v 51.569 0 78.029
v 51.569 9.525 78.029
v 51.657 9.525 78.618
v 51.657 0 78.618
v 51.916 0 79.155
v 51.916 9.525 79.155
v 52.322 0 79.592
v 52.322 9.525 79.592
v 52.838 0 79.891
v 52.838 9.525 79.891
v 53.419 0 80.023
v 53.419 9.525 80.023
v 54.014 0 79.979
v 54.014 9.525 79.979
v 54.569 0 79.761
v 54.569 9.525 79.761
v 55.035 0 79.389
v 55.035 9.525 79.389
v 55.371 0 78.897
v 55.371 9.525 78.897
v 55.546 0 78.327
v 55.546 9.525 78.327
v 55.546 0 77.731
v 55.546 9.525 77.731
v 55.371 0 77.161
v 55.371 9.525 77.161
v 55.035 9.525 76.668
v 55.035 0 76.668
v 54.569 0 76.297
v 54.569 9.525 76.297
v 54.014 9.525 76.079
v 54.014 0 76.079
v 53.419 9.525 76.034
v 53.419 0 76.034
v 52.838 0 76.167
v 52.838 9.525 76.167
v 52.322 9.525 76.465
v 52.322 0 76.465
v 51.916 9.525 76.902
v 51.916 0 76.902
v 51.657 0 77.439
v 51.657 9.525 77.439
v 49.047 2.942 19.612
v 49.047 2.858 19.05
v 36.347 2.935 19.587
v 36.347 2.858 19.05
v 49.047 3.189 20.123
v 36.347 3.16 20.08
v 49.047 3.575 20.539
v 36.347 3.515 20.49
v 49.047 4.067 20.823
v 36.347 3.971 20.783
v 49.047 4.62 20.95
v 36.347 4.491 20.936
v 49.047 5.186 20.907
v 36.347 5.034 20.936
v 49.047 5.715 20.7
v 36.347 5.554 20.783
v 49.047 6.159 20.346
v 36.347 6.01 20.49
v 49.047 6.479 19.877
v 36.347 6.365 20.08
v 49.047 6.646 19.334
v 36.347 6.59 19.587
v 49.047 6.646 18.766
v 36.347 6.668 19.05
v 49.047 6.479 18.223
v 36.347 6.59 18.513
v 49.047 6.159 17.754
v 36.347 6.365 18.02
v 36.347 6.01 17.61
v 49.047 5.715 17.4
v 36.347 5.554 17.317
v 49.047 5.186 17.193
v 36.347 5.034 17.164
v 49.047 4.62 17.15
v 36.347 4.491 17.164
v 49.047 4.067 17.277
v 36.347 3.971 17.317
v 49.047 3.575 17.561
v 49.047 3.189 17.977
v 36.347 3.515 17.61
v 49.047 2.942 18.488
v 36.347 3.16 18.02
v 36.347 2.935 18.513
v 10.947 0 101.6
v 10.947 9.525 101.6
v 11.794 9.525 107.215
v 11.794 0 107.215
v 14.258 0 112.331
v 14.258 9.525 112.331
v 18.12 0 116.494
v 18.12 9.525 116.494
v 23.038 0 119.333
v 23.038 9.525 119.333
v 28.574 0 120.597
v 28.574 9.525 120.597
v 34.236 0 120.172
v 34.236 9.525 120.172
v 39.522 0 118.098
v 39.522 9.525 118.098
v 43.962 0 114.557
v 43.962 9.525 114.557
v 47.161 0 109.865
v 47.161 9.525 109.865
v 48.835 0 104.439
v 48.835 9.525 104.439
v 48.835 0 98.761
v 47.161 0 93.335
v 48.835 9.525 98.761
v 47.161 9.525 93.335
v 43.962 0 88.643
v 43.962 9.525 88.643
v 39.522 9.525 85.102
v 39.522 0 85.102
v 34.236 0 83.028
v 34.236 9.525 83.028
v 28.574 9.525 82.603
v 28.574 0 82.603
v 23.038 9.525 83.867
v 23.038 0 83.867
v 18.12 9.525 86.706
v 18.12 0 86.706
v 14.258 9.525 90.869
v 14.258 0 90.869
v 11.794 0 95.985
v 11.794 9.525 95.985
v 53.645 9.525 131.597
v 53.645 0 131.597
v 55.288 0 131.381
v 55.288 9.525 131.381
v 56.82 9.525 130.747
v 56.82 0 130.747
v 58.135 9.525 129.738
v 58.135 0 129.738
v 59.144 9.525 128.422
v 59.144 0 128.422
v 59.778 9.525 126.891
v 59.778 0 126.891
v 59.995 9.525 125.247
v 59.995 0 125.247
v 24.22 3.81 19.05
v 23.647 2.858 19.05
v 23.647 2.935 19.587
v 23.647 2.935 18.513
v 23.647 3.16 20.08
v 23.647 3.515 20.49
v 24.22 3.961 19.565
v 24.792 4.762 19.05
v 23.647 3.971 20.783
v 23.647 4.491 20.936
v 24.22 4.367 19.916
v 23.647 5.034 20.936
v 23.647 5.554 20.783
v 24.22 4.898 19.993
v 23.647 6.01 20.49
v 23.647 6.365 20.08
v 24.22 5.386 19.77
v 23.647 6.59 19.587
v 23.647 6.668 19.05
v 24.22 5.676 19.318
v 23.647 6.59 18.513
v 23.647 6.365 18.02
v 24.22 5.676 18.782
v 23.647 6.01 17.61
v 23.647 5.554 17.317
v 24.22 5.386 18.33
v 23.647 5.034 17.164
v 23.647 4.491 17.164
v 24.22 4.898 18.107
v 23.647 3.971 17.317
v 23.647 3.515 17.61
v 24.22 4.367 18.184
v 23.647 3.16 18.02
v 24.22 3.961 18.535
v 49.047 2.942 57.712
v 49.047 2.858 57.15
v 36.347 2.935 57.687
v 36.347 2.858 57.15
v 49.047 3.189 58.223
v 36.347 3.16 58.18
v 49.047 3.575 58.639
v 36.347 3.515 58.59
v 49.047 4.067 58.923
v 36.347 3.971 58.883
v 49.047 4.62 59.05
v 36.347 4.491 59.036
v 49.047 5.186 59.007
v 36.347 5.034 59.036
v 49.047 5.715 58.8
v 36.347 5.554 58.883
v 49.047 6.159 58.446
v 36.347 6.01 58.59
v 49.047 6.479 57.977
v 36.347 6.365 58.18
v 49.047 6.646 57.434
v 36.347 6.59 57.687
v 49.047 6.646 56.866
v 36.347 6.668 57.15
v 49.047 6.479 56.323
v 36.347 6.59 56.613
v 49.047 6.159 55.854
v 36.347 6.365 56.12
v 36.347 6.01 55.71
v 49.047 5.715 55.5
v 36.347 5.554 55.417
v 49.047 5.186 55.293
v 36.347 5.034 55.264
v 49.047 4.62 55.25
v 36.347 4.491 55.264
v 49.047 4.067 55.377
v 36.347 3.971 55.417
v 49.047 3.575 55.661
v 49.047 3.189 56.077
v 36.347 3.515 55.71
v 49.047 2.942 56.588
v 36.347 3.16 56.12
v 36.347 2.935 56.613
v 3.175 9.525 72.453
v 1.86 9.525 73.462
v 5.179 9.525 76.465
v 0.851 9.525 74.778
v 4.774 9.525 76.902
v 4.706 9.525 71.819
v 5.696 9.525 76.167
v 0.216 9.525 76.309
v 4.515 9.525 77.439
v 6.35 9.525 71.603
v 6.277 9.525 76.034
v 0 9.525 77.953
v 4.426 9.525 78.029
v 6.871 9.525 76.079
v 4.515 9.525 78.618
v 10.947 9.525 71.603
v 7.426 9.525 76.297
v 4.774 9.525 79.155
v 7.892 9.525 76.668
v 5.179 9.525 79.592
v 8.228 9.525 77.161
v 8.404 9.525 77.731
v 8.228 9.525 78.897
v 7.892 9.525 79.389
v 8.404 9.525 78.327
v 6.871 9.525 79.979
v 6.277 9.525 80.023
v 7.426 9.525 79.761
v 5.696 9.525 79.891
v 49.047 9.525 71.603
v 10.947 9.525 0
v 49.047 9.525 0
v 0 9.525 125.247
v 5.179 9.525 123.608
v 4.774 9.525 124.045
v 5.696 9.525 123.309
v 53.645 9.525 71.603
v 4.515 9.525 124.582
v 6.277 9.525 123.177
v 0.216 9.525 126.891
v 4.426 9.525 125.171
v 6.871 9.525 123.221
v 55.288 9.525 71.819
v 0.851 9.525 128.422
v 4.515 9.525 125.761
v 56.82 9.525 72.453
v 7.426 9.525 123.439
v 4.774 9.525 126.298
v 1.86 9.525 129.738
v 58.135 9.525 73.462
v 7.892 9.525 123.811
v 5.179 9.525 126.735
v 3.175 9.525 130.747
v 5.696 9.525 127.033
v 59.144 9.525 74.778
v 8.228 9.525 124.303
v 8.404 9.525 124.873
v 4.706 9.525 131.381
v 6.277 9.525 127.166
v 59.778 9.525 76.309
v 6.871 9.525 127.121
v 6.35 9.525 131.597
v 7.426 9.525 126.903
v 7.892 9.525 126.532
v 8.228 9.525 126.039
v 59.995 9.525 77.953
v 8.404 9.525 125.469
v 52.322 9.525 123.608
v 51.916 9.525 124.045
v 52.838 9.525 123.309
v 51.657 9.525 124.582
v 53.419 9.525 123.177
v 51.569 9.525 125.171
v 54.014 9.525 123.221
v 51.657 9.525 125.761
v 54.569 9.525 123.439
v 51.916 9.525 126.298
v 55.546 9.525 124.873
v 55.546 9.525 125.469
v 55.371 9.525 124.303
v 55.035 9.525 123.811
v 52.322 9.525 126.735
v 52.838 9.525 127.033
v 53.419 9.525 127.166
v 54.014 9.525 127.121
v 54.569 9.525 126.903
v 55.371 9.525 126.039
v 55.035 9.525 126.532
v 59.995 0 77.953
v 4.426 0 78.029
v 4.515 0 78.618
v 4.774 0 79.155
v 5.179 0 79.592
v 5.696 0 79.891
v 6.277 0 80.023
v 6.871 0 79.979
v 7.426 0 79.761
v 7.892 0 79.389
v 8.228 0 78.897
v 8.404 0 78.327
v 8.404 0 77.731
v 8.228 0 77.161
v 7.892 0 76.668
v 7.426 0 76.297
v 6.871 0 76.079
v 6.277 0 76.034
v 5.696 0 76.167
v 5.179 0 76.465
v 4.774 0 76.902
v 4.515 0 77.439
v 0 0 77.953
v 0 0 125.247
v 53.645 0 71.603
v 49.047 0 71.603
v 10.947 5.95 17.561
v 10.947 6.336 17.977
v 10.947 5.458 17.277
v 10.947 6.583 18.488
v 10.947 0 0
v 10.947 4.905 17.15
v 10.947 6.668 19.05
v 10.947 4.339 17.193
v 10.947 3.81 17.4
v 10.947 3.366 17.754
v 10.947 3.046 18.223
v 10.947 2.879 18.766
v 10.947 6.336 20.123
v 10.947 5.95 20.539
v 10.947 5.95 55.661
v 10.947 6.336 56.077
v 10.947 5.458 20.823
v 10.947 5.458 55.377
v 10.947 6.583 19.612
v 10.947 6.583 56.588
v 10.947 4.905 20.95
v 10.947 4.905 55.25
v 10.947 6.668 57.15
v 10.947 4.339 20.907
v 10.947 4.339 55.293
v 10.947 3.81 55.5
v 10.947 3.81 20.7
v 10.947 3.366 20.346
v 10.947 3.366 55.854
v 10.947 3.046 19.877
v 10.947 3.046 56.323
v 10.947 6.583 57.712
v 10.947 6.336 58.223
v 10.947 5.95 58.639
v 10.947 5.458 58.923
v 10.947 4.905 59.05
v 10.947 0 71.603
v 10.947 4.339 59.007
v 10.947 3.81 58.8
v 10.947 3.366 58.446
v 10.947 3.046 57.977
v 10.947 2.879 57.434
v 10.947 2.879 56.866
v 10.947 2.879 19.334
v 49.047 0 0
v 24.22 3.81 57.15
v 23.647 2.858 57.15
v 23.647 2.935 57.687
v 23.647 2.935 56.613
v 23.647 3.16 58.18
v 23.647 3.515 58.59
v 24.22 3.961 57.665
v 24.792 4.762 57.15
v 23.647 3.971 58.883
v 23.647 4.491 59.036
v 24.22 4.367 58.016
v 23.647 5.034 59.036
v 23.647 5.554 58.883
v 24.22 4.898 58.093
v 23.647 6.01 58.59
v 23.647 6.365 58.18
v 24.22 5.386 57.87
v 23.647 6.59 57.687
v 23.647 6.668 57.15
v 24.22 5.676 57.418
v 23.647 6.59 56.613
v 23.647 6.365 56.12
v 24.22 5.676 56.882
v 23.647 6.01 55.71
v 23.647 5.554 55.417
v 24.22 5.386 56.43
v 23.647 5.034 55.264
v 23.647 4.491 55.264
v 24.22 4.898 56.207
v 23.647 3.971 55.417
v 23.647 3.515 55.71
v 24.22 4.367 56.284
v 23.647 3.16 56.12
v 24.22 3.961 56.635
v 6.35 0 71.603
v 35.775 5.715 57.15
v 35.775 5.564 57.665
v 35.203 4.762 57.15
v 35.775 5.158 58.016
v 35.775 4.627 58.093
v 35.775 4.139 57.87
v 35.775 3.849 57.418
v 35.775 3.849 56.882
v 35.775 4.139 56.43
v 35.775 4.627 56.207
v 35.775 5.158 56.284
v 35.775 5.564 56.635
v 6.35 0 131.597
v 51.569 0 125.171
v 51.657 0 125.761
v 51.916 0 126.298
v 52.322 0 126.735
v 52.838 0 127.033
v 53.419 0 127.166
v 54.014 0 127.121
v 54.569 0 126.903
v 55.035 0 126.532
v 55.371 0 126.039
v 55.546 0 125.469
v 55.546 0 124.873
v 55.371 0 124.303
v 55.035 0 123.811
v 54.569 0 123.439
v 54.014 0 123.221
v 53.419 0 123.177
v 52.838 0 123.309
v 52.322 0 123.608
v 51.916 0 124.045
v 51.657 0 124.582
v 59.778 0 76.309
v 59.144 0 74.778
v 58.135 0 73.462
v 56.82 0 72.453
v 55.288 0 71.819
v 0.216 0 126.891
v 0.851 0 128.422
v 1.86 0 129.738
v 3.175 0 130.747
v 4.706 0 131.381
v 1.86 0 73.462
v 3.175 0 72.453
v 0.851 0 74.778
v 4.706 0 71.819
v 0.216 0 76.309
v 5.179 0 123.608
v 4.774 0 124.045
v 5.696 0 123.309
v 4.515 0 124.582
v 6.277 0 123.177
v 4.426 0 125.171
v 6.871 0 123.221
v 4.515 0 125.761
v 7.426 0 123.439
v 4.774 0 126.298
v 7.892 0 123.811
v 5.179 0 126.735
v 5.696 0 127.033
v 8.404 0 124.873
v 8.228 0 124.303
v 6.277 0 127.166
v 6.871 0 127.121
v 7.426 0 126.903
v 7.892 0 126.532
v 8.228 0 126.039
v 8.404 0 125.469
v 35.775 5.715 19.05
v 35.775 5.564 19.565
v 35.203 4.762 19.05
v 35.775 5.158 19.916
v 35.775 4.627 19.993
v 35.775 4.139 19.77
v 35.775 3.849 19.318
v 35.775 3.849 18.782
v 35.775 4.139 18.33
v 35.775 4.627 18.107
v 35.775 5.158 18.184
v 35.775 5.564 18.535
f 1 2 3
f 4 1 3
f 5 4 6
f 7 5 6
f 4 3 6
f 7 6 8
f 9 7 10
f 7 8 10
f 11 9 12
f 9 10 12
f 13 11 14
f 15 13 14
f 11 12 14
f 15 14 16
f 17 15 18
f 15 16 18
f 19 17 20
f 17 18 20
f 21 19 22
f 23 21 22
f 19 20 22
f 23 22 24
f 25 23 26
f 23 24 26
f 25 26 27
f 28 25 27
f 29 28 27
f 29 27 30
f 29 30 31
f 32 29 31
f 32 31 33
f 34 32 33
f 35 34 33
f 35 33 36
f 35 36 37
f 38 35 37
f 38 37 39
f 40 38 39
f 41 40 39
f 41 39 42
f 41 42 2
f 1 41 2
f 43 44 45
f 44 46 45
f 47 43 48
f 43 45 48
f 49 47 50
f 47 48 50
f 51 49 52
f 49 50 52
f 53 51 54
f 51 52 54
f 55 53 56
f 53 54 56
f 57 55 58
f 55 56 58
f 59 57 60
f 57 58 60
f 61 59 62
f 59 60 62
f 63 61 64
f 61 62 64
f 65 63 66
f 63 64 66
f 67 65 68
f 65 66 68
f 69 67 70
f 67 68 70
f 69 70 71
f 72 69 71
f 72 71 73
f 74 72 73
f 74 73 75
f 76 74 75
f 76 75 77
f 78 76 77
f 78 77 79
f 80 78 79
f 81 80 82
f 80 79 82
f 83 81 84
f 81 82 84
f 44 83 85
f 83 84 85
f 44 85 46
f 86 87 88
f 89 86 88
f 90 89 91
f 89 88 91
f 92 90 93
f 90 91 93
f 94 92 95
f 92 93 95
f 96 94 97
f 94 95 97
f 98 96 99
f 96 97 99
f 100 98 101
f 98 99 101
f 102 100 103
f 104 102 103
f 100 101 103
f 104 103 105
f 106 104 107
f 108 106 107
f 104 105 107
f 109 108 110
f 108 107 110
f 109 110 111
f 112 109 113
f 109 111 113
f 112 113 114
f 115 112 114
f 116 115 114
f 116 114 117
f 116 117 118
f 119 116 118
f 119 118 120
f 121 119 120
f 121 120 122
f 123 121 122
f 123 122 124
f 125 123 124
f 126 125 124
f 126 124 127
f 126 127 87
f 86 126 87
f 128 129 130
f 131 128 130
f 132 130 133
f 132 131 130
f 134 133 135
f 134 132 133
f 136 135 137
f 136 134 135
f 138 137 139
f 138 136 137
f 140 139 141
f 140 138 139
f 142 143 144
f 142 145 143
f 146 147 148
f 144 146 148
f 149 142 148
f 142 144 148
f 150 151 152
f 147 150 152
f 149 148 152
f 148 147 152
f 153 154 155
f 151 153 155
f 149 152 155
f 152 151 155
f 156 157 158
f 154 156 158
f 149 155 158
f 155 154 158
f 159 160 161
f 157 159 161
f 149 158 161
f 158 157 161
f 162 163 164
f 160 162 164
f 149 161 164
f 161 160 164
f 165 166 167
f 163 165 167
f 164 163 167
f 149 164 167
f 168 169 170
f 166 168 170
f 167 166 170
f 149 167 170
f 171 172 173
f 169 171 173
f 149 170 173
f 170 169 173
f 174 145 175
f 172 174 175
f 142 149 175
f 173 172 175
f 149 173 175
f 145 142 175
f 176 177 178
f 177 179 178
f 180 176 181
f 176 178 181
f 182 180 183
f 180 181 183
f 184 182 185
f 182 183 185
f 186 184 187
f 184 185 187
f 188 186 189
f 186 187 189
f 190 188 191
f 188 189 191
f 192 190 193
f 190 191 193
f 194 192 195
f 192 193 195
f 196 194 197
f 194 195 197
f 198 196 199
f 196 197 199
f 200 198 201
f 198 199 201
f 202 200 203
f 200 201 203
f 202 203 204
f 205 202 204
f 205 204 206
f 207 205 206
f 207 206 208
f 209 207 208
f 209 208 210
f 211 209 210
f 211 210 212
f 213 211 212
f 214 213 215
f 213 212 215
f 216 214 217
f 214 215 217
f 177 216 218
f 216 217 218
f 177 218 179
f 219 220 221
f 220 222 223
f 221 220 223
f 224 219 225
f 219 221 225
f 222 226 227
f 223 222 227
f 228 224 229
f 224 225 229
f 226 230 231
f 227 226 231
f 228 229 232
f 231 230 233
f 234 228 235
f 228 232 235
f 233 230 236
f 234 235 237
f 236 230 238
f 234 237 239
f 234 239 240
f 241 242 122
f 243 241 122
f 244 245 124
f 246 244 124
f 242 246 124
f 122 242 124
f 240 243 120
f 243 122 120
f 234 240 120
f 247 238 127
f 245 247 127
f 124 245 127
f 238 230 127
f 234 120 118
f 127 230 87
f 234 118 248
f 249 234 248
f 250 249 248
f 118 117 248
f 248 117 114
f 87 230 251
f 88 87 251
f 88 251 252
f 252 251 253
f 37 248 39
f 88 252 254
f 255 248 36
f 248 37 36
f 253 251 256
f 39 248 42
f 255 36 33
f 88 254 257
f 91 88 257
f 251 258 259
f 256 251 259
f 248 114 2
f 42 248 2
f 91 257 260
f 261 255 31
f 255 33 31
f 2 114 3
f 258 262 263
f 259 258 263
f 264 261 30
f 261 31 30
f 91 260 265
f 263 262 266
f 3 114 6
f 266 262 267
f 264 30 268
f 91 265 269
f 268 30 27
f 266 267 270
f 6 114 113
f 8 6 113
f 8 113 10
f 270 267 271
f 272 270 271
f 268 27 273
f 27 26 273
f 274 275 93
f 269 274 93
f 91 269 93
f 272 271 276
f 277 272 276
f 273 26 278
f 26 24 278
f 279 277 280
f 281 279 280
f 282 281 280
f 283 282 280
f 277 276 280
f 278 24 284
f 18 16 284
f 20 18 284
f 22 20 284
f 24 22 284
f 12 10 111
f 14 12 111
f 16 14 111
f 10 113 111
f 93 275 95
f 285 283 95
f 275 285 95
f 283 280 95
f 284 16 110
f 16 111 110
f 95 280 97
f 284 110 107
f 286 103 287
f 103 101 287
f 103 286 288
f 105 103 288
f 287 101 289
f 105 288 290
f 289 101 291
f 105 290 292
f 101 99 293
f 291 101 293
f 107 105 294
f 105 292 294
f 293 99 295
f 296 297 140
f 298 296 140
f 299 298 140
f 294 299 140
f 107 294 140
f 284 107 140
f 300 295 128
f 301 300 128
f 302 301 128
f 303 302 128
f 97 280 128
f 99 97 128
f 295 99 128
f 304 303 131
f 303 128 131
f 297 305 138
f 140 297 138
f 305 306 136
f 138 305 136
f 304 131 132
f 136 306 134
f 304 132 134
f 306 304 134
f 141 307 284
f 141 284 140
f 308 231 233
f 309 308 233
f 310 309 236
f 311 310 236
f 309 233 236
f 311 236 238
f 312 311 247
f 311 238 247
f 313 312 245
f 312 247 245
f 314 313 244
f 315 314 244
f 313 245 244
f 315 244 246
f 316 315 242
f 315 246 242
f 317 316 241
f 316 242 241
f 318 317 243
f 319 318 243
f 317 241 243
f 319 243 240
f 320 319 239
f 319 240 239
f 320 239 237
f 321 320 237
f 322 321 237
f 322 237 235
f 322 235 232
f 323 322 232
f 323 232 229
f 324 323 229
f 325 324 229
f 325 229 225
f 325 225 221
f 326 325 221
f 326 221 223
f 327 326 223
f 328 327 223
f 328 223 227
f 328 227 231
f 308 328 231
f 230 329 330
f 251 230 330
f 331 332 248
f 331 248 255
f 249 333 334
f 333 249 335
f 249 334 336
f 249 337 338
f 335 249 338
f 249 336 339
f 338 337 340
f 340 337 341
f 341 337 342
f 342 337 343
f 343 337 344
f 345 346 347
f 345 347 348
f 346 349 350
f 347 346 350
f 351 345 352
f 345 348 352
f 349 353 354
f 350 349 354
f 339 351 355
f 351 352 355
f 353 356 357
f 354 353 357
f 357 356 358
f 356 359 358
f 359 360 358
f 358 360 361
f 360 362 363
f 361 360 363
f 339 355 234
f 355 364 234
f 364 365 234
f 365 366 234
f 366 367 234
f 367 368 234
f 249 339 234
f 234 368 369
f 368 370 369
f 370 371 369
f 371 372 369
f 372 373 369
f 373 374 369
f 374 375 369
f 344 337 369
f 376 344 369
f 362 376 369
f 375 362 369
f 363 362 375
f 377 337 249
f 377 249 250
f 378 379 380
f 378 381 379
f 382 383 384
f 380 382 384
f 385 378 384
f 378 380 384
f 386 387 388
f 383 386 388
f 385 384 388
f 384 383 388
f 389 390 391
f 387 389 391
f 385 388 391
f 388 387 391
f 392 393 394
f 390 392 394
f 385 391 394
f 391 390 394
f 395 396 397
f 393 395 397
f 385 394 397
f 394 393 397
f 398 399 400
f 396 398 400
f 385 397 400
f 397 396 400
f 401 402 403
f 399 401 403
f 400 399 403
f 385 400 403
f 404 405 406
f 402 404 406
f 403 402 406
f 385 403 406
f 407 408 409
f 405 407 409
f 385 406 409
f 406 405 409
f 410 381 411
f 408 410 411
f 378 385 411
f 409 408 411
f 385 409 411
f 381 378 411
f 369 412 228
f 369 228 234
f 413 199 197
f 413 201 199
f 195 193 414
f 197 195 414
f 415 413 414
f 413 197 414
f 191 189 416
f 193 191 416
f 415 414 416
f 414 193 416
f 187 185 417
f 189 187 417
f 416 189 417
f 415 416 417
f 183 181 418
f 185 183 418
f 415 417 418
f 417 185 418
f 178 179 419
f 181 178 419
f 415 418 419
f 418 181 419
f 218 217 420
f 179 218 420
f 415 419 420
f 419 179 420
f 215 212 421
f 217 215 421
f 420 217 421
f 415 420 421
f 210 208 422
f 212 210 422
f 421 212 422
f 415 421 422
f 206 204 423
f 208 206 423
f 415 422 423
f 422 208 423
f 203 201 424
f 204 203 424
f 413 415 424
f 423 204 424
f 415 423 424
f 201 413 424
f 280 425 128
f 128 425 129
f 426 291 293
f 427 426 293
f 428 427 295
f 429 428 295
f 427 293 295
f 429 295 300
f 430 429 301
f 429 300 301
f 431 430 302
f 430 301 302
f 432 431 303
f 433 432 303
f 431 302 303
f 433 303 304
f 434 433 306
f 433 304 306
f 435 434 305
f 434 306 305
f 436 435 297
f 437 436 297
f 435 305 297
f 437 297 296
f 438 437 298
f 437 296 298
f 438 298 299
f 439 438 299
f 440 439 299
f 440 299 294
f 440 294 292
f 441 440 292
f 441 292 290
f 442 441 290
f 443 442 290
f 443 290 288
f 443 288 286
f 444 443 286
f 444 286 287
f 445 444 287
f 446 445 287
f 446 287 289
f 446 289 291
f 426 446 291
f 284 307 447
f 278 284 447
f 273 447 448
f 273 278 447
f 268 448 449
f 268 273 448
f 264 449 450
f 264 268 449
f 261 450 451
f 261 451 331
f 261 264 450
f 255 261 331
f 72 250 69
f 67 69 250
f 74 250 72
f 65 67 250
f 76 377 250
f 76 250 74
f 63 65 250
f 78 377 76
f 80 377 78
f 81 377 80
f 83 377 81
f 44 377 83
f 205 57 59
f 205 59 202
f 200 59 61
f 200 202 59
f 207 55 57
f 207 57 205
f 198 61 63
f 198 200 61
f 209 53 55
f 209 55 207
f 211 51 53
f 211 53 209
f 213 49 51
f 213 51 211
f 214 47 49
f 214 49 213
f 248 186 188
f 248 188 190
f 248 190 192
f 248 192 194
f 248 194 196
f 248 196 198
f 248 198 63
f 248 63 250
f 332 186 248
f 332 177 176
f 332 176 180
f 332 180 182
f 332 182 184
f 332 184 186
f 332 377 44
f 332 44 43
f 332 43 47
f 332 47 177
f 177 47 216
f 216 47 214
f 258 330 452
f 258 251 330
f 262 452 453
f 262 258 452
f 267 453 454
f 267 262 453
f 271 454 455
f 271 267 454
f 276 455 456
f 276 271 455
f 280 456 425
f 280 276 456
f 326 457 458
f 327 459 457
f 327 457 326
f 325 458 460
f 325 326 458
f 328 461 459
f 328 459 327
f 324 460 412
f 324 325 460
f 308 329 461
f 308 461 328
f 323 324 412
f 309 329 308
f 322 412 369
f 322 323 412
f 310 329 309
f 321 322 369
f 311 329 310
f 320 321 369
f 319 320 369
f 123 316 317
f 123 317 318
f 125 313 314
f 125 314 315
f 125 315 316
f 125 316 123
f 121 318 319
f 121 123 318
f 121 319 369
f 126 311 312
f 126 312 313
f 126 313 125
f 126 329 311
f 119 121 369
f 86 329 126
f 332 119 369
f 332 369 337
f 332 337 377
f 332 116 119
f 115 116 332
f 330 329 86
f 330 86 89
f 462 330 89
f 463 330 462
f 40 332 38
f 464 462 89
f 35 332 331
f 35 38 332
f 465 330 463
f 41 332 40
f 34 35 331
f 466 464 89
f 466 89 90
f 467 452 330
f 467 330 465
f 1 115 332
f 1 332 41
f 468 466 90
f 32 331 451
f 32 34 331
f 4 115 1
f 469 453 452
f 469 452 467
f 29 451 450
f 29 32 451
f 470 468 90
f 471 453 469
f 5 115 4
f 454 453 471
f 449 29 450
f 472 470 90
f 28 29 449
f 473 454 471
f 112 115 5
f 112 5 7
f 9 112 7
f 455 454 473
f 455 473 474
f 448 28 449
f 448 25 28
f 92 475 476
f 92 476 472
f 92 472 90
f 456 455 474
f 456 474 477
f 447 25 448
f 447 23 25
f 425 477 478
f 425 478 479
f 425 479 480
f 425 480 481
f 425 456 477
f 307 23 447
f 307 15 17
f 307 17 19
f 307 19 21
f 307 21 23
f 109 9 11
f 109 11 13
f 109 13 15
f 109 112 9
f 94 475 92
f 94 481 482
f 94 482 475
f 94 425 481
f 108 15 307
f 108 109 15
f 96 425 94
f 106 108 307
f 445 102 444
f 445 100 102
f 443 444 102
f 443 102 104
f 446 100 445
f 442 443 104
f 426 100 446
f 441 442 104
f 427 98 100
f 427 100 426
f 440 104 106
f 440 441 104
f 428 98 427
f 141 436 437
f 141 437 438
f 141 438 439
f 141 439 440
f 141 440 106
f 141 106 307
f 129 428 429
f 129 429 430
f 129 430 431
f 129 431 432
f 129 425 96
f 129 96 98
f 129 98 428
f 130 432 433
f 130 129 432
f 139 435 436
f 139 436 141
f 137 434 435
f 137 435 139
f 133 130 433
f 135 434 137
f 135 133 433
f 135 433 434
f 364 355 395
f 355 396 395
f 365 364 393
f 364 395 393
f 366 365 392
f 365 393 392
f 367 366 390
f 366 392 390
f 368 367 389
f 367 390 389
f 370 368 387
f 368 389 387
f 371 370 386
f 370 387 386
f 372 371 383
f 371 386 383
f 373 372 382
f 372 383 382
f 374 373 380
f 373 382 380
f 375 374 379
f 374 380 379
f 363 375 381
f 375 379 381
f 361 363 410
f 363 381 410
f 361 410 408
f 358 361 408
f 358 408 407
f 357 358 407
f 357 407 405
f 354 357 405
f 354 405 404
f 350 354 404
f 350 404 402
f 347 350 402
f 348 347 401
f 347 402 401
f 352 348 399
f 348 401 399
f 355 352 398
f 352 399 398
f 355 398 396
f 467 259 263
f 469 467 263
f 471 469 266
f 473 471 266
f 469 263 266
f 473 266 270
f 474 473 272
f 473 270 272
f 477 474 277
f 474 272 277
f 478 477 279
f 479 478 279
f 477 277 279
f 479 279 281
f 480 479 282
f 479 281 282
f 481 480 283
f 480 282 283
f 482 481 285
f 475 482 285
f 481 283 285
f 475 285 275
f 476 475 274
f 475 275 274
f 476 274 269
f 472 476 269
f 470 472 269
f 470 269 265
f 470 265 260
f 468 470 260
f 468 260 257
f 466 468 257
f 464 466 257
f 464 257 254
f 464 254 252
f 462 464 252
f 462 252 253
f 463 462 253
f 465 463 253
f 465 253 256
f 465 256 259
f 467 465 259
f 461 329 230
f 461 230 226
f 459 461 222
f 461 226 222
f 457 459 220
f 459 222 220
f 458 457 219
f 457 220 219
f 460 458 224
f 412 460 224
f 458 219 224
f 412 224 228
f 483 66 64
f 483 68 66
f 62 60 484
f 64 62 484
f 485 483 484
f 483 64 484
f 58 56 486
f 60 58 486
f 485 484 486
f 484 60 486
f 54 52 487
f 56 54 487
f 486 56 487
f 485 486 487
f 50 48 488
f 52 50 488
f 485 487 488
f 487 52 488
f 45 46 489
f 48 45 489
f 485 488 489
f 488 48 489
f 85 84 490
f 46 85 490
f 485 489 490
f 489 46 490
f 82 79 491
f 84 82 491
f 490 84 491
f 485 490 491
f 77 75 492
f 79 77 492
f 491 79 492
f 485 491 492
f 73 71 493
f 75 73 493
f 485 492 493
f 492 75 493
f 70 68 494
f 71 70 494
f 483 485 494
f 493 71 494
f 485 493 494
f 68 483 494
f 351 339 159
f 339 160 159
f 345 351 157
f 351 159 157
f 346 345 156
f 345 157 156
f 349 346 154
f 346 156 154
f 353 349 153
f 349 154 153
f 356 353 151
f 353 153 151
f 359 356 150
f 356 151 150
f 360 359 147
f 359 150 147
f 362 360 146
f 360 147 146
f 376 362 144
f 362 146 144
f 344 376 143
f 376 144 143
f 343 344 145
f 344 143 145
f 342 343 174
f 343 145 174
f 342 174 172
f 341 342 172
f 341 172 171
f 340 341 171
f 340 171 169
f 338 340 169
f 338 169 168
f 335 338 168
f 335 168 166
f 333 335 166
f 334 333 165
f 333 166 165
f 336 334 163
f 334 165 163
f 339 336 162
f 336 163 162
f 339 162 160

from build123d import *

# Parameters (mm, degrees)
F0_W      = 59.9948
F0_H      = 131.5974
F1_DEPTH  = 9.525
F4_D      = 4
F2_W      = 10.9474
F2_H      = 71.6026
F5_DEPTH  = 9.526
F6_R      = 6.35
F8_D      = 38.1
F10_D     = 3.81
F10_DEPTH = 12.7
F10_TIP   = 1.1446394792
F12_D     = 3.81
F12_DEPTH = 12.7
F12_TIP   = 1.1446394792


with BuildPart() as f1:
    # F0 (on Front) → F1 (new body)
    with BuildSketch(Plane.XZ):
        with Locations((29.9974, 65.7987)):
            Rectangle(F0_W, F0_H)
    extrude(amount=-F1_DEPTH)

    # F4 (through all)
    with Locations(Plane.XZ):
        with Locations((6.4262, 125.1712), (6.4262, 78.0288), (53.5686, 78.0288), (53.5686, 125.1712)):
            Hole(F4_D / 2)

    # F2 (on face) → F5 (cut, through all)
    with BuildSketch(Plane.XZ):
        with Locations((5.4737, 35.8013)):
            Rectangle(F2_W, F2_H)
        with Locations((54.5211, 35.8013)):
            Rectangle(F2_W, F2_H)
    extrude(amount=-F5_DEPTH, mode=Mode.SUBTRACT)

    # F6
    f6_edges = [f1.edges().sort_by_distance(p)[0] for p in [
        (0, 4.7625, 131.5974),
        (59.9948, 4.7625, 131.5974),
        (0, 4.7625, 71.6026),
        (59.9948, 4.7625, 71.6026),
    ]]
    fillet(f6_edges, radius=F6_R)

    # F8 (through all)
    with Locations(Plane.XZ):
        with Locations((29.9974, 101.6)):
            Hole(F8_D / 2)

    # F10
    with Locations(Plane.YZ.offset(49.0474)):
        with Locations((4.7625, 57.15), (4.7625, 19.05)):
            Hole(F10_D / 2, depth=F10_DEPTH)
            with Locations((0, 0, -(F10_DEPTH + F10_TIP / 2))):  # 118° drill point
                Cone(0, F10_D / 2, F10_TIP, mode=Mode.SUBTRACT)

    # F12
    with Locations(Plane(origin=(10.9474, 0, 0), x_dir=(0, -1, 0), z_dir=(-1, 0, 0))):
        with Locations((-4.7625, 57.15), (-4.7625, 19.05)):
            Hole(F12_D / 2, depth=F12_DEPTH)
            with Locations((0, 0, -(F12_DEPTH + F12_TIP / 2))):  # 118° drill point
                Cone(0, F12_D / 2, F12_TIP, mode=Mode.SUBTRACT)


solid = f1.part
